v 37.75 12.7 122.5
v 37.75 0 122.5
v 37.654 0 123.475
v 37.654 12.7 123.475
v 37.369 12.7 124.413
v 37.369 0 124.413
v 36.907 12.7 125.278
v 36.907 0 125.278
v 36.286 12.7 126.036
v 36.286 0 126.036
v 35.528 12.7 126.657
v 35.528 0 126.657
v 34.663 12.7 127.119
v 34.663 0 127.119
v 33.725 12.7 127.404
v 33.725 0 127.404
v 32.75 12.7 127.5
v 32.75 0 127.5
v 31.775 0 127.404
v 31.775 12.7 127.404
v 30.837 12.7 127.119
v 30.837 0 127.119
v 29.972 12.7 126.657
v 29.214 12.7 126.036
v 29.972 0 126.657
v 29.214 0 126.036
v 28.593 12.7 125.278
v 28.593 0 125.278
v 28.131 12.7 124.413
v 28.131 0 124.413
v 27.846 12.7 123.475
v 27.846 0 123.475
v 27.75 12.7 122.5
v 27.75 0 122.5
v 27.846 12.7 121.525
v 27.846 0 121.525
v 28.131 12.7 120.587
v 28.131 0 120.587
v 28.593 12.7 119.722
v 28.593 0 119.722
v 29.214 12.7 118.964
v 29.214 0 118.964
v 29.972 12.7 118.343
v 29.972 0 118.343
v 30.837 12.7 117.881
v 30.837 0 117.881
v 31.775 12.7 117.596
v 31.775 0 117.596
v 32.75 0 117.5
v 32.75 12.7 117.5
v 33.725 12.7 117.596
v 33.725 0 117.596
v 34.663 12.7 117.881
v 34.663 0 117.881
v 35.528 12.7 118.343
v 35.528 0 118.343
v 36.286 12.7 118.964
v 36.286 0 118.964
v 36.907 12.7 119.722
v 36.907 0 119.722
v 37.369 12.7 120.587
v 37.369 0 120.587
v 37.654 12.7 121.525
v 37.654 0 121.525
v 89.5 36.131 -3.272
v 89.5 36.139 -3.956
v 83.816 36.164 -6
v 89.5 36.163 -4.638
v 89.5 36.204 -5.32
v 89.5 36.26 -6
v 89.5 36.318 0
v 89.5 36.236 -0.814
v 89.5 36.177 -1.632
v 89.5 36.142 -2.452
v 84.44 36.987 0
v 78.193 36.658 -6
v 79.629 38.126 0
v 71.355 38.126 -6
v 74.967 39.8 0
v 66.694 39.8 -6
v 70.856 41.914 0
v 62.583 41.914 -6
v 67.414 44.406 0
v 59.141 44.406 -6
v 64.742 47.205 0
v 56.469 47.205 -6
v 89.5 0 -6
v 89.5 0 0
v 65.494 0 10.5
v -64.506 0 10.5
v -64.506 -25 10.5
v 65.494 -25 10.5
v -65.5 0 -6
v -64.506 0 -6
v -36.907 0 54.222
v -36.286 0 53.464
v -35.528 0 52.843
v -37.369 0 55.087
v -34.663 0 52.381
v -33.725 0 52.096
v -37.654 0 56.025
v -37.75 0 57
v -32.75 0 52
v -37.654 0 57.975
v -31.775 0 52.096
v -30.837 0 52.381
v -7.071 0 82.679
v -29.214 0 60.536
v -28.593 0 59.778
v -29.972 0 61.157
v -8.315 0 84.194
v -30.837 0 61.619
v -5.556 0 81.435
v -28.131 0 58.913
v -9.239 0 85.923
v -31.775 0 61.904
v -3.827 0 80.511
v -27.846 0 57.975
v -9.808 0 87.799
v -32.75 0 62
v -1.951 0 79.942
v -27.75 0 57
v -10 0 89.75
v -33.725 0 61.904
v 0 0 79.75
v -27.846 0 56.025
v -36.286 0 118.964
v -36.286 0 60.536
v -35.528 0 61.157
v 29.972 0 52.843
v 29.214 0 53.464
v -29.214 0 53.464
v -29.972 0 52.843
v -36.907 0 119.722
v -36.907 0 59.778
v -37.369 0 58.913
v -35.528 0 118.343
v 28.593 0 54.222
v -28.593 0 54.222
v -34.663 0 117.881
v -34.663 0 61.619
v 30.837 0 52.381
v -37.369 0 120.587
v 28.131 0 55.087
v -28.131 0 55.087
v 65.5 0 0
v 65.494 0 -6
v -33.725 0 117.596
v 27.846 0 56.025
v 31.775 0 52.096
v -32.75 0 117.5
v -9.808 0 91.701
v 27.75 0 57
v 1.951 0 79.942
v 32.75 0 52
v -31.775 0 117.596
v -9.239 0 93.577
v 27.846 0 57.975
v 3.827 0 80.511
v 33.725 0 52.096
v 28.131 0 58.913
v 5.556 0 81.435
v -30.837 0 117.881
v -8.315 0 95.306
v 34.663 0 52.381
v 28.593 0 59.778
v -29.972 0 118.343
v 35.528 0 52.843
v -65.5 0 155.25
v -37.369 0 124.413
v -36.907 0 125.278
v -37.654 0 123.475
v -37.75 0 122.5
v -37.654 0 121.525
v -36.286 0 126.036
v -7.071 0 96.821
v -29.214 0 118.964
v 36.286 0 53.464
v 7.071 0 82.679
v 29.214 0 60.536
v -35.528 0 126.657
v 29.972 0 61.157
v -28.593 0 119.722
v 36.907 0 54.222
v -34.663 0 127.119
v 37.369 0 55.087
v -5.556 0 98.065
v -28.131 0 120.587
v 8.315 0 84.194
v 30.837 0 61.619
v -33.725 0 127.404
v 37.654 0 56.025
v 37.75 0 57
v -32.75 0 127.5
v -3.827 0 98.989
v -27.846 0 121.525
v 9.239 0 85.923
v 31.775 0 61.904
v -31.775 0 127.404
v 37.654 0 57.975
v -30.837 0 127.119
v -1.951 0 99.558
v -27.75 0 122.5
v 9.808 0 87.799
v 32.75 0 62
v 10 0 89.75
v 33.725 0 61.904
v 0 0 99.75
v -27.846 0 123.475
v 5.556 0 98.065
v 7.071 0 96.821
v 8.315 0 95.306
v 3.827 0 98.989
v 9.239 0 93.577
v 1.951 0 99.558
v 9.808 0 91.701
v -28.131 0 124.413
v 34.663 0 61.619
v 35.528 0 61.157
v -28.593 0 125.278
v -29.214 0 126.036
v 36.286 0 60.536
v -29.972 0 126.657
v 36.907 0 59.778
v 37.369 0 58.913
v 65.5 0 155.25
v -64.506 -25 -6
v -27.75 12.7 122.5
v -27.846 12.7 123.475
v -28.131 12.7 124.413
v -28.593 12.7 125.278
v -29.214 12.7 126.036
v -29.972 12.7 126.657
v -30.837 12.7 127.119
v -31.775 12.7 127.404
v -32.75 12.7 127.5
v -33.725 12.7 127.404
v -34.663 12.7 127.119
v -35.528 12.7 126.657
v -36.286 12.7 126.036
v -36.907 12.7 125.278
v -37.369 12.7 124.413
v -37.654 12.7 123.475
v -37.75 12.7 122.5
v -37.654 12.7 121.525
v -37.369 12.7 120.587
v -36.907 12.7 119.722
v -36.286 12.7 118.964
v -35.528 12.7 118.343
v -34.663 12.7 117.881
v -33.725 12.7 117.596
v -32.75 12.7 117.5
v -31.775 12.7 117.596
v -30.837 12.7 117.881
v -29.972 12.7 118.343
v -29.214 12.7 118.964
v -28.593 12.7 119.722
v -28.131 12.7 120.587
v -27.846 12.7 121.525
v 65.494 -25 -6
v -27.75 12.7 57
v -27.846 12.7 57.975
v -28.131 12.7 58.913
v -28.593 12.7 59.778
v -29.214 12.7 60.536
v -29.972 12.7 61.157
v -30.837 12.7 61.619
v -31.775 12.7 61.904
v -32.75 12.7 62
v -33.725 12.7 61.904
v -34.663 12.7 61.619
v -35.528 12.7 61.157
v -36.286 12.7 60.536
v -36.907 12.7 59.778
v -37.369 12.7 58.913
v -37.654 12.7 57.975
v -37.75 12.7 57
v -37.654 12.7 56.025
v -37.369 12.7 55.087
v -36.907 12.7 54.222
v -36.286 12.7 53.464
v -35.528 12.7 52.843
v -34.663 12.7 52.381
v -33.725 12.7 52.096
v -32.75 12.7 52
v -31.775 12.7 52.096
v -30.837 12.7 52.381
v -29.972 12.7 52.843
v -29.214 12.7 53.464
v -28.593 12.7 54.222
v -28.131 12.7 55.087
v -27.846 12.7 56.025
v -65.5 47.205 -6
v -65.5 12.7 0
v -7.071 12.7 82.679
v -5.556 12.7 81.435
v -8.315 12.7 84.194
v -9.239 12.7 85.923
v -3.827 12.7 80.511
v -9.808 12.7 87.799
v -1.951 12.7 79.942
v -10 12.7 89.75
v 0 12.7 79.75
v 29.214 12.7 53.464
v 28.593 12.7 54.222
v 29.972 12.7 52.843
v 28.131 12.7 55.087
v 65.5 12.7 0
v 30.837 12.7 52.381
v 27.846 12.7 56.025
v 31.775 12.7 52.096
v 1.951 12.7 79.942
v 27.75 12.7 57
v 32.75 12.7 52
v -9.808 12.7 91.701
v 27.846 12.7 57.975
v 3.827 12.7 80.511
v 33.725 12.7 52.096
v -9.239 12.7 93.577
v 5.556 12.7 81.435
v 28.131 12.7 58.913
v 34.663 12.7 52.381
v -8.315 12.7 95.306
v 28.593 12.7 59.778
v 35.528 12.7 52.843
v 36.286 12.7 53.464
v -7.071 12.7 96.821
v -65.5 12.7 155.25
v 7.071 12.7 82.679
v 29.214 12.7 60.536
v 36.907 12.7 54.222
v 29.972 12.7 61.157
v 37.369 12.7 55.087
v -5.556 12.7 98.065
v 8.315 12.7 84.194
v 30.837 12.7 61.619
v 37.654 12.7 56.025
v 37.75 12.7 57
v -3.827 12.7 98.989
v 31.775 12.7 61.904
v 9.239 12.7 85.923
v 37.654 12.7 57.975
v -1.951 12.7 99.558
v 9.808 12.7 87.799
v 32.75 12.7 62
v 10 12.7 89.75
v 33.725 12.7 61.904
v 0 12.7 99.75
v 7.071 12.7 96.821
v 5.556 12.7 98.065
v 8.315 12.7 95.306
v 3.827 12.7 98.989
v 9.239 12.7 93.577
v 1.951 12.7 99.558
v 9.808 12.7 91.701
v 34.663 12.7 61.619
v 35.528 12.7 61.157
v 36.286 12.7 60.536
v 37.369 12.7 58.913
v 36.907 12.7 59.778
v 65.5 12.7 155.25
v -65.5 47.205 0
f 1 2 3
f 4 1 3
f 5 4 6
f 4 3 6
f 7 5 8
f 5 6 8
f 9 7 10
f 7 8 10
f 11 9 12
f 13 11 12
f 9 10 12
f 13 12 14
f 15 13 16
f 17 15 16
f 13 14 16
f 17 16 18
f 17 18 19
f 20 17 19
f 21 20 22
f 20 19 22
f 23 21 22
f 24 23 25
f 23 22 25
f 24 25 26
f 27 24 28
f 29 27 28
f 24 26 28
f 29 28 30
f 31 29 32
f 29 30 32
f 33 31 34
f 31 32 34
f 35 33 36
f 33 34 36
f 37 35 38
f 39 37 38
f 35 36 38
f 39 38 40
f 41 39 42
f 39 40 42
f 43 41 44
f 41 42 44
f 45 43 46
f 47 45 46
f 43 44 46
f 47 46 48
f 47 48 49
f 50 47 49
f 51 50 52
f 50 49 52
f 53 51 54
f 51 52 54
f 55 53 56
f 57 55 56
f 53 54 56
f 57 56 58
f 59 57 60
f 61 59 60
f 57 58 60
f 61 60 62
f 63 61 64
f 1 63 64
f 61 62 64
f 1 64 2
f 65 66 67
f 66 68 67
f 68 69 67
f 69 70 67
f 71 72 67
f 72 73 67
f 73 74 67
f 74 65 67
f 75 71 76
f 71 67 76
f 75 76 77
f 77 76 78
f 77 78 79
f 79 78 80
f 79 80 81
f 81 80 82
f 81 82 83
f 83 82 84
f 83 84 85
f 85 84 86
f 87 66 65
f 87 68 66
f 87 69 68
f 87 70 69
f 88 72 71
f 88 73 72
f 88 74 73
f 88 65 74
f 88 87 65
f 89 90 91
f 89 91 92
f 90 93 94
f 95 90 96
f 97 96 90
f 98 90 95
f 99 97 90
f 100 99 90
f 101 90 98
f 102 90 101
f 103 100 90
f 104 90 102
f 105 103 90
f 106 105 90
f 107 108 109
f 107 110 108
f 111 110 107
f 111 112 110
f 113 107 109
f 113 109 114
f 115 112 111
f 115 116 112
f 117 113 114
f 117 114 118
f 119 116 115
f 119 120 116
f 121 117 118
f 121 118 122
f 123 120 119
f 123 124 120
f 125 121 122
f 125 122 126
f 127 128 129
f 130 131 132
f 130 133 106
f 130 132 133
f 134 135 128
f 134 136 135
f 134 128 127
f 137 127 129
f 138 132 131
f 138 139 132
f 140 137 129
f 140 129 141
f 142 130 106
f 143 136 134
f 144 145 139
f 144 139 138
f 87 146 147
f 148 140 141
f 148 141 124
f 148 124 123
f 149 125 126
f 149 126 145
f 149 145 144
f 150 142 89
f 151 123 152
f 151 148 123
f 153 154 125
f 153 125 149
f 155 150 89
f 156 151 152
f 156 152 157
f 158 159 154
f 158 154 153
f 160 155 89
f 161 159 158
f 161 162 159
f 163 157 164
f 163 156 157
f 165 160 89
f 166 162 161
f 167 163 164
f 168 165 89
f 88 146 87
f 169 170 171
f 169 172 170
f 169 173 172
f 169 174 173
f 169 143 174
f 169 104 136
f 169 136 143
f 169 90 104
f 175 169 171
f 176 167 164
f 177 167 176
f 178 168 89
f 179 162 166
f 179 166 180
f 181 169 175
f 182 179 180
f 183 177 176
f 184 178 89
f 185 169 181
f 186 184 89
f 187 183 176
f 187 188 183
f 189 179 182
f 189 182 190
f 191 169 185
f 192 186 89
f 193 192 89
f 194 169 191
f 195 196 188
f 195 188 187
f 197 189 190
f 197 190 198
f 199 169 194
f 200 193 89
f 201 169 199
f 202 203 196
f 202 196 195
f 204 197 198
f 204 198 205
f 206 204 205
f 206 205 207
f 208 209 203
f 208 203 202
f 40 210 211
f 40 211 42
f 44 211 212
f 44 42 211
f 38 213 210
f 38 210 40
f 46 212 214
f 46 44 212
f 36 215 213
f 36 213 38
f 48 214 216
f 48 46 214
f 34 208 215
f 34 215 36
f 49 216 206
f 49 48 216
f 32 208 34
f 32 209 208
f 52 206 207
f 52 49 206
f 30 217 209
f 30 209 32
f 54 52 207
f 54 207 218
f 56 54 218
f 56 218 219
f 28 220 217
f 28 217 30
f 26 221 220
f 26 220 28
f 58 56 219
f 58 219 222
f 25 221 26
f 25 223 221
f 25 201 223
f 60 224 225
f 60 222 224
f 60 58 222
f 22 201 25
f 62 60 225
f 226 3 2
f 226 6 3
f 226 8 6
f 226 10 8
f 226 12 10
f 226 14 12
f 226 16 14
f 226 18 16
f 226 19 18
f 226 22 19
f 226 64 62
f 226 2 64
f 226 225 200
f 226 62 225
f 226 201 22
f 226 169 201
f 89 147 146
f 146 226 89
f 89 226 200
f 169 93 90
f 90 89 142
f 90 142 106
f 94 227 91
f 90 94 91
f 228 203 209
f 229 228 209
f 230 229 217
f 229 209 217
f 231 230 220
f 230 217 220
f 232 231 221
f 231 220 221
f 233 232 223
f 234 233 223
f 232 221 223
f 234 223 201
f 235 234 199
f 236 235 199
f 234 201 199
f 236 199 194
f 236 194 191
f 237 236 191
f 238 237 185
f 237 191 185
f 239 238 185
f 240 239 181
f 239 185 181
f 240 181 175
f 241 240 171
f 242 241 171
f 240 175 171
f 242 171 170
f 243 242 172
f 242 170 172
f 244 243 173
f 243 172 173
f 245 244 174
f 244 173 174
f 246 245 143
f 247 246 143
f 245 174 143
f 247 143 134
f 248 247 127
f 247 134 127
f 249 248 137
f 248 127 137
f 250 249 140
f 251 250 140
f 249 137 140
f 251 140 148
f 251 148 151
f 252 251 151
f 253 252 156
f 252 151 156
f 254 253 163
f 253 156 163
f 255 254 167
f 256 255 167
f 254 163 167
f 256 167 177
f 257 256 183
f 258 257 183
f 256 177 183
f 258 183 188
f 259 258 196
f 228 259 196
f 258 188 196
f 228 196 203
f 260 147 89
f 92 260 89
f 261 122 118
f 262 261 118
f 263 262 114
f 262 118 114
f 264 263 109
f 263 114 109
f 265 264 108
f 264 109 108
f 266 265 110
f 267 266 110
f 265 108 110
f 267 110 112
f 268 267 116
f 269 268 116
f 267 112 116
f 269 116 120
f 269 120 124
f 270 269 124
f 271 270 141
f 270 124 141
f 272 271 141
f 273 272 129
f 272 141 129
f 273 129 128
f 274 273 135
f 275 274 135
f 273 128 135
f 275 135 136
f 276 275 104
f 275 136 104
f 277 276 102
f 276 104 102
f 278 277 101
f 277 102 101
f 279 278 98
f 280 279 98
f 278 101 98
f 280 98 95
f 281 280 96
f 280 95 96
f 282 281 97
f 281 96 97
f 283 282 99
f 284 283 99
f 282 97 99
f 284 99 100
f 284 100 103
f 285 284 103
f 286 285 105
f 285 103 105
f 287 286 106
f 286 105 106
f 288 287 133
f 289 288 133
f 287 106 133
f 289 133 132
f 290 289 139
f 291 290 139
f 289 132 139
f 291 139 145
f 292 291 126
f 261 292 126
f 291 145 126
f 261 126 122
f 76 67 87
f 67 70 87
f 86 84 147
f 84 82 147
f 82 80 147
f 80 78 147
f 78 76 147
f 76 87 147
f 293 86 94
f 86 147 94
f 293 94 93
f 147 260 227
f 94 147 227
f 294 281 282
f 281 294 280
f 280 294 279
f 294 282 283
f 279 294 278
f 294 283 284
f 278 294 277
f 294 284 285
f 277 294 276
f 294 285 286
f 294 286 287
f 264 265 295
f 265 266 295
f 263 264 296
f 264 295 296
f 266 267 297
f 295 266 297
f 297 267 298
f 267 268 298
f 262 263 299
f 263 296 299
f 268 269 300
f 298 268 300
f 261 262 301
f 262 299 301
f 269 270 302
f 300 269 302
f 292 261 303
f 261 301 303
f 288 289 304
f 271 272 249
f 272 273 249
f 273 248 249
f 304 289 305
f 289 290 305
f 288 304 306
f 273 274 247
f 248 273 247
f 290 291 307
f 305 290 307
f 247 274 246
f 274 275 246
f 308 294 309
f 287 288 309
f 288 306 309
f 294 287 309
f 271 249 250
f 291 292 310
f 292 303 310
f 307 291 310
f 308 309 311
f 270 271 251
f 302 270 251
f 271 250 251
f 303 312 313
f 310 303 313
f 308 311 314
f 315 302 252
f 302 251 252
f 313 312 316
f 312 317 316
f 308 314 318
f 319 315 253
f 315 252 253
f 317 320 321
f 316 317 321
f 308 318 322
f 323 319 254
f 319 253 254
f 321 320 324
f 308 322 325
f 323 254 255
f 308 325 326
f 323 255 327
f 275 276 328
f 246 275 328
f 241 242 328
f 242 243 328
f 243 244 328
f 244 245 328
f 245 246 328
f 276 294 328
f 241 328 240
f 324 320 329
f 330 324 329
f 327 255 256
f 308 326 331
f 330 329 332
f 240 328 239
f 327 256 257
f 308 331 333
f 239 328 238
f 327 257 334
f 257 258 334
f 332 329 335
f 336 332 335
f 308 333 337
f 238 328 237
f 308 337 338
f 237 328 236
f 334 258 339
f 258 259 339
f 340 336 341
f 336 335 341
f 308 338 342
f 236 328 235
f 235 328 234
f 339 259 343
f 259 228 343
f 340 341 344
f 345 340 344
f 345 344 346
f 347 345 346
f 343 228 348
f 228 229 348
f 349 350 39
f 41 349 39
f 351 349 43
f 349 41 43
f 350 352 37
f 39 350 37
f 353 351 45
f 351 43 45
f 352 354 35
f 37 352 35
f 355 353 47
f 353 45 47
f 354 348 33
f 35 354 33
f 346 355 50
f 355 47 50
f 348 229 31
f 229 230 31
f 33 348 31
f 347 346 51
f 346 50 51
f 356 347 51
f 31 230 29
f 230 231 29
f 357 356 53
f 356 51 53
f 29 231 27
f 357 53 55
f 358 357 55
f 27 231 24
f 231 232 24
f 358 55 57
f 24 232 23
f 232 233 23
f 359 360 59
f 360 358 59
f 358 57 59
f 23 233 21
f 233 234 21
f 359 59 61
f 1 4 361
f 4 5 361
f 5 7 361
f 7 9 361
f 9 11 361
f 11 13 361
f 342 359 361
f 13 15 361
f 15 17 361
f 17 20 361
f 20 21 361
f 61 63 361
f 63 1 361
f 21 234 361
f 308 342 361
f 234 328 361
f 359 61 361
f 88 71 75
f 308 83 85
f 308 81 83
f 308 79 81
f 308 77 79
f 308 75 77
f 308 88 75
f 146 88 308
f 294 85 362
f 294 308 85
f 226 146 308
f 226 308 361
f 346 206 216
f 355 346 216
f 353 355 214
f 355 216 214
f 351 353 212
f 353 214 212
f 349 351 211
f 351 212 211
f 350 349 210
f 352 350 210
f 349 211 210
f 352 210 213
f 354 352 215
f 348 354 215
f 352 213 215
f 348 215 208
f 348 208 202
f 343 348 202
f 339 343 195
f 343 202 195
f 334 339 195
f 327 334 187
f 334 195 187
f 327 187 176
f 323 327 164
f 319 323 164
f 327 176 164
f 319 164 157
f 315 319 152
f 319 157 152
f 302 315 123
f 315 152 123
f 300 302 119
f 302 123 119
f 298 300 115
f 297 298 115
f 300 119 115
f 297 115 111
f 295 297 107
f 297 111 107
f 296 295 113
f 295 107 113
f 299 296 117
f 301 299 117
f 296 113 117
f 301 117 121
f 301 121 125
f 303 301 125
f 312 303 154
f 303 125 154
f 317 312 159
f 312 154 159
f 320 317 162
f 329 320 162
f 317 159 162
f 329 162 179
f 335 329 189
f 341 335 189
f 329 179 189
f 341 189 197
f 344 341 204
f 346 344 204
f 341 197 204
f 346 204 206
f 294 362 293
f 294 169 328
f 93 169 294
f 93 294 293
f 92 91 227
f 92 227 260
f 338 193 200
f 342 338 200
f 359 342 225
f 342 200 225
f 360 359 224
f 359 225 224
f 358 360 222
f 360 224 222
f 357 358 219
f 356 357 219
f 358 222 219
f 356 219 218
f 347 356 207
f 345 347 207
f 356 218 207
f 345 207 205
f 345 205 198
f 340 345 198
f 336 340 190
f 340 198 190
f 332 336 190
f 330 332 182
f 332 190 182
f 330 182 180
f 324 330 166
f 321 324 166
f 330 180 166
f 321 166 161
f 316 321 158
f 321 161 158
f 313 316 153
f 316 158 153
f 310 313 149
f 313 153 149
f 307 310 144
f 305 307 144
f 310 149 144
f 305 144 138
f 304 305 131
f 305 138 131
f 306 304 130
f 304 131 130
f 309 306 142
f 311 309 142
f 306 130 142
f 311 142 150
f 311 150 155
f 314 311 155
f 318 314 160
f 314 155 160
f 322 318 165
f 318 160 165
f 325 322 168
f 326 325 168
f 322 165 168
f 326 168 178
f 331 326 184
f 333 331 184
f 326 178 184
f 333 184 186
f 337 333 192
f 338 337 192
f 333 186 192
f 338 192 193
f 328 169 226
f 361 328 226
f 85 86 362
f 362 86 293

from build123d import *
from build123d import SkipClean  # not in build123d's __all__

# Parameters (mm, degrees)
F0_W      = 131
F0_H      = 155.25
F0_R      = 5
F0_R_2    = 10
F1_DEPTH  = 12.7
F2_DEPTH  = 150
F3_R      = 4.7625
F4_DEPTH  = 167.951
F6_DEPTH  = 55
F9_W      = 46.4503765106
F9_H      = 23.6088857055
F10_DEPTH = 100.6187200546
F12_DEPTH = 150.001
F14_DEPTH = 89.0000760555
F15_R     = 18.8692896997
F16_DEPTH = 210.4837932836
F18_W     = 28.0103459954
F18_H     = 33.3821959794
F19_DEPTH = 57.4413500726
F23_DEPTH = 37.3063087463
F25_DEPTH = 262.8513174901
F26_W     = 130
F26_H     = 33
F27_DEPTH = 25
F28_DEPTH = 47.1665114164
F29_W     = 130
F29_H     = 16.5
F30_DEPTH = 374.0004003048


with BuildPart() as f1:
    # F0 (on Front) → F1 (new body)
    with BuildSketch(Plane.XZ):
        with Locations((0, 77.625)):
            Rectangle(F0_W, F0_H)
        with Locations((-32.75, 57)):
            Circle(F0_R, mode=Mode.SUBTRACT)
        with Locations((32.75, 57)):
            Circle(F0_R, mode=Mode.SUBTRACT)
        with Locations((0, 89.75)):
            Circle(F0_R_2, mode=Mode.SUBTRACT)
        with Locations((-32.75, 122.5)):
            Circle(F0_R, mode=Mode.SUBTRACT)
        with Locations((32.75, 122.5)):
            Circle(F0_R, mode=Mode.SUBTRACT)
    extrude(amount=-F1_DEPTH)

    # F0 (on Front) → F2 (join)
    with BuildSketch(Plane.XZ):
        Polygon((89.5, 0), (65.5, 0), (-65.5, 0), (-65.5, -12.7), (89.5, -12.7), align=None)
    extrude(amount=-F2_DEPTH)

    # F3 (on face) → F4 (cut, through all)
    with BuildSketch(Plane(origin=(0, 0, -12.7), x_dir=(1, 0, 0), z_dir=(0, 0, -1))):
        with Locations((-40, -55.7)):
            Circle(F3_R)
        with Locations((-40, -118.2)):
            Circle(F3_R)
        with Locations((64, -118.2)):
            Circle(F3_R)
        with Locations((64, -55.7)):
            Circle(F3_R)
    extrude(amount=-F4_DEPTH, mode=Mode.SUBTRACT)

    # F5 (on face) → F6 (join)
    with BuildSketch(Plane.XZ):
        Polygon((76.5, -12.7), (-63.5, -12.7), (-44.9285714286, -100.7630571853), align=None)
    extrude(amount=-F6_DEPTH)

    # F7 (on face) → F8 (revolve)
    with BuildSketch(Plane(origin=(32.4031609217, 0, -44.6801379177), x_dir=(0.8095238095, 0, 0.5870870479), z_dir=(0.5870870479, 0, -0.8095238095))):
        Polygon((18.2698592544, -37.5), (54.4725659202, -37.5), (54.4725659202, -30), (-45.5274340798, -30), (-45.5274340798, -37.5), align=None)
    revolve(axis=Axis((36.0238095238, 55, -42.0543523951), (-0.8095238095, 0, -0.5870870479)))

    # F9 (on face) → F10 (cut)
    with BuildSketch(Plane.YZ.offset(89.5)):
        with Locations((57.3695674539, 11.8044428527)):
            Rectangle(F9_W, F9_H)
    extrude(amount=-F10_DEPTH, mode=Mode.SUBTRACT)

    # F11 (on Front) → F12 (cut, through all)
    with BuildSketch(Plane.XZ):
        Polygon((-55.6169226766, -72.8361010551), (-44.6262694895, -72.8361010551), (-44.6262694895, -12.6905664802), (-63.8953074813, -12.6905664802), (-63.8953074813, -72.8361010551), align=None)
        Polygon((-4.5890193433, -104.113265872), (-4.5890193433, -72.8361010551), (-44.6262694895, -72.8361010551), (-55.6169226766, -72.8361010551), (-55.6169226766, -104.113265872), align=None)
    extrude(amount=-F12_DEPTH, mode=Mode.SUBTRACT)

    # F13 (on face) → F14 (cut)
    with BuildSketch(Plane(origin=(0, 55, 0), x_dir=(-1, 0, 0), z_dir=(0, 1, 0))):
        Polygon((76.3912552581, -71.6465198879), (44.6262694895, -60.2878452083), (44.6262694895, -72.8361010551), (6.4205920826, -72.8361010551), (4.4523809524, -71.4087047902), (-10.0519139283, -91.4084170785), (37.2047263411, -125.6801223738), align=None)
        Polygon((44.6262694895, -60.2878452083), (19.1295571499, -51.1706095521), (14.7264042907, -57.2420381235), (4.4523809524, -71.4087047902), (6.4205920826, -72.8361010551), (44.6262694895, -72.8361010551), align=None)
    extrude(amount=-F14_DEPTH, mode=Mode.SUBTRACT)

    # F15 (on face) → F16 (cut, through all)
    with BuildSketch(Plane(origin=(-36.8555418741, 0, -26.7285668724), x_dir=(0, -1, 0), z_dir=(-0.8095238095, 0, -0.5870870479))):
        with Locations((-55, -55.1931115454)):
            Circle(F15_R)
        with BuildLine():
            ThreePointArc((-37.5, -55.1931115454), (-67.3743686708, -67.5674802162), (-55, -37.6931115454))
            Line((-55, -37.6931115454), (-55, -55.1931115454))
            Line((-55, -55.1931115454), (-37.5, -55.1931115454))
        make_face(mode=Mode.SUBTRACT)
        with BuildLine():
            Line((-55, -55.1931115454), (-55, -37.6931115454))
            ThreePointArc((-55, -37.6931115454), (-67.3743686708, -67.5674802162), (-37.5, -55.1931115454))
            Line((-37.5, -55.1931115454), (-55, -55.1931115454))
        make_face()
    with SkipClean():  # cleaning this boolean's faces spoils the solid; the shape is the same uncleaned
        extrude(amount=-F16_DEPTH, mode=Mode.SUBTRACT)

    # F18 (on offset) → F19 (cut)
    with BuildSketch(Plane(origin=(0, 0, -69.7121929049), x_dir=(1, 0, 0), z_dir=(0, 0, -1))):
        with Locations((-40.2482412755, -55.8588486165)):
            Rectangle(F18_W, F18_H)
    with SkipClean():  # cleaning this boolean's faces spoils the solid; the shape is the same uncleaned
        extrude(amount=-F19_DEPTH, mode=Mode.SUBTRACT)

    # F22 (on offset) → F23 (join)
    with BuildSketch(Plane(origin=(0, 66.3563400507, 0), x_dir=(-1, 0, 0), z_dir=(0, 1, 0))):
        Polygon((-19.5, -25.368578732), (9.2864632607, -47.1396760544), (25.5, -47.1396760544), (25.5, -10.8354373375), (-19.5, -10.8354373375), align=None)
    with SkipClean():  # cleaning this boolean's faces spoils the solid; the shape is the same uncleaned
        extrude(amount=-F23_DEPTH)

    # F24 (on offset) → F25 (cut, through all)
    with BuildSketch(Plane(origin=(0, 0, -107.6003174901), x_dir=(1, 0, 0), z_dir=(0, 0, -1))):
        Polygon((105.054743588, -47.2050309181), (-70.2532827854, -47.2050309181), (-70.2532827854, -164.4858419895), (108.5324063897, -164.4858419895), align=None)
    extrude(amount=-F25_DEPTH, mode=Mode.SUBTRACT)

    # F26 (on Front) → F27 (join)
    with BuildSketch(Plane.XZ):
        with Locations((0.4943662184, -6)):
            Rectangle(F26_W, F26_H)
    extrude(amount=F27_DEPTH)

    # F28 (add): a face of the model
    f28_faces = [f1.faces().sort_by_distance(p)[0] for p in [
        (-54.5656671683, 0, -17.5954279167),
    ]]
    extrude(f28_faces, amount=F28_DEPTH)

    # F29 (on face) → F30 (cut)
    with BuildSketch(Plane.XZ.offset(25)):
        Polygon((102.4388783057, -90.8307954669), (102.4388783057, -6), (65.4943662184, -6), (65.4943662184, -22.5), (-64.5056337816, -22.5), (-64.5056337816, -6), (-95.0750373681, -6), (-96.5073853731, -90.8307954669), align=None)
        with Locations((0.4943662184, -14.25)):
            Rectangle(F29_W, F29_H)
    extrude(amount=-F30_DEPTH, mode=Mode.SUBTRACT)


solid = f1.part
